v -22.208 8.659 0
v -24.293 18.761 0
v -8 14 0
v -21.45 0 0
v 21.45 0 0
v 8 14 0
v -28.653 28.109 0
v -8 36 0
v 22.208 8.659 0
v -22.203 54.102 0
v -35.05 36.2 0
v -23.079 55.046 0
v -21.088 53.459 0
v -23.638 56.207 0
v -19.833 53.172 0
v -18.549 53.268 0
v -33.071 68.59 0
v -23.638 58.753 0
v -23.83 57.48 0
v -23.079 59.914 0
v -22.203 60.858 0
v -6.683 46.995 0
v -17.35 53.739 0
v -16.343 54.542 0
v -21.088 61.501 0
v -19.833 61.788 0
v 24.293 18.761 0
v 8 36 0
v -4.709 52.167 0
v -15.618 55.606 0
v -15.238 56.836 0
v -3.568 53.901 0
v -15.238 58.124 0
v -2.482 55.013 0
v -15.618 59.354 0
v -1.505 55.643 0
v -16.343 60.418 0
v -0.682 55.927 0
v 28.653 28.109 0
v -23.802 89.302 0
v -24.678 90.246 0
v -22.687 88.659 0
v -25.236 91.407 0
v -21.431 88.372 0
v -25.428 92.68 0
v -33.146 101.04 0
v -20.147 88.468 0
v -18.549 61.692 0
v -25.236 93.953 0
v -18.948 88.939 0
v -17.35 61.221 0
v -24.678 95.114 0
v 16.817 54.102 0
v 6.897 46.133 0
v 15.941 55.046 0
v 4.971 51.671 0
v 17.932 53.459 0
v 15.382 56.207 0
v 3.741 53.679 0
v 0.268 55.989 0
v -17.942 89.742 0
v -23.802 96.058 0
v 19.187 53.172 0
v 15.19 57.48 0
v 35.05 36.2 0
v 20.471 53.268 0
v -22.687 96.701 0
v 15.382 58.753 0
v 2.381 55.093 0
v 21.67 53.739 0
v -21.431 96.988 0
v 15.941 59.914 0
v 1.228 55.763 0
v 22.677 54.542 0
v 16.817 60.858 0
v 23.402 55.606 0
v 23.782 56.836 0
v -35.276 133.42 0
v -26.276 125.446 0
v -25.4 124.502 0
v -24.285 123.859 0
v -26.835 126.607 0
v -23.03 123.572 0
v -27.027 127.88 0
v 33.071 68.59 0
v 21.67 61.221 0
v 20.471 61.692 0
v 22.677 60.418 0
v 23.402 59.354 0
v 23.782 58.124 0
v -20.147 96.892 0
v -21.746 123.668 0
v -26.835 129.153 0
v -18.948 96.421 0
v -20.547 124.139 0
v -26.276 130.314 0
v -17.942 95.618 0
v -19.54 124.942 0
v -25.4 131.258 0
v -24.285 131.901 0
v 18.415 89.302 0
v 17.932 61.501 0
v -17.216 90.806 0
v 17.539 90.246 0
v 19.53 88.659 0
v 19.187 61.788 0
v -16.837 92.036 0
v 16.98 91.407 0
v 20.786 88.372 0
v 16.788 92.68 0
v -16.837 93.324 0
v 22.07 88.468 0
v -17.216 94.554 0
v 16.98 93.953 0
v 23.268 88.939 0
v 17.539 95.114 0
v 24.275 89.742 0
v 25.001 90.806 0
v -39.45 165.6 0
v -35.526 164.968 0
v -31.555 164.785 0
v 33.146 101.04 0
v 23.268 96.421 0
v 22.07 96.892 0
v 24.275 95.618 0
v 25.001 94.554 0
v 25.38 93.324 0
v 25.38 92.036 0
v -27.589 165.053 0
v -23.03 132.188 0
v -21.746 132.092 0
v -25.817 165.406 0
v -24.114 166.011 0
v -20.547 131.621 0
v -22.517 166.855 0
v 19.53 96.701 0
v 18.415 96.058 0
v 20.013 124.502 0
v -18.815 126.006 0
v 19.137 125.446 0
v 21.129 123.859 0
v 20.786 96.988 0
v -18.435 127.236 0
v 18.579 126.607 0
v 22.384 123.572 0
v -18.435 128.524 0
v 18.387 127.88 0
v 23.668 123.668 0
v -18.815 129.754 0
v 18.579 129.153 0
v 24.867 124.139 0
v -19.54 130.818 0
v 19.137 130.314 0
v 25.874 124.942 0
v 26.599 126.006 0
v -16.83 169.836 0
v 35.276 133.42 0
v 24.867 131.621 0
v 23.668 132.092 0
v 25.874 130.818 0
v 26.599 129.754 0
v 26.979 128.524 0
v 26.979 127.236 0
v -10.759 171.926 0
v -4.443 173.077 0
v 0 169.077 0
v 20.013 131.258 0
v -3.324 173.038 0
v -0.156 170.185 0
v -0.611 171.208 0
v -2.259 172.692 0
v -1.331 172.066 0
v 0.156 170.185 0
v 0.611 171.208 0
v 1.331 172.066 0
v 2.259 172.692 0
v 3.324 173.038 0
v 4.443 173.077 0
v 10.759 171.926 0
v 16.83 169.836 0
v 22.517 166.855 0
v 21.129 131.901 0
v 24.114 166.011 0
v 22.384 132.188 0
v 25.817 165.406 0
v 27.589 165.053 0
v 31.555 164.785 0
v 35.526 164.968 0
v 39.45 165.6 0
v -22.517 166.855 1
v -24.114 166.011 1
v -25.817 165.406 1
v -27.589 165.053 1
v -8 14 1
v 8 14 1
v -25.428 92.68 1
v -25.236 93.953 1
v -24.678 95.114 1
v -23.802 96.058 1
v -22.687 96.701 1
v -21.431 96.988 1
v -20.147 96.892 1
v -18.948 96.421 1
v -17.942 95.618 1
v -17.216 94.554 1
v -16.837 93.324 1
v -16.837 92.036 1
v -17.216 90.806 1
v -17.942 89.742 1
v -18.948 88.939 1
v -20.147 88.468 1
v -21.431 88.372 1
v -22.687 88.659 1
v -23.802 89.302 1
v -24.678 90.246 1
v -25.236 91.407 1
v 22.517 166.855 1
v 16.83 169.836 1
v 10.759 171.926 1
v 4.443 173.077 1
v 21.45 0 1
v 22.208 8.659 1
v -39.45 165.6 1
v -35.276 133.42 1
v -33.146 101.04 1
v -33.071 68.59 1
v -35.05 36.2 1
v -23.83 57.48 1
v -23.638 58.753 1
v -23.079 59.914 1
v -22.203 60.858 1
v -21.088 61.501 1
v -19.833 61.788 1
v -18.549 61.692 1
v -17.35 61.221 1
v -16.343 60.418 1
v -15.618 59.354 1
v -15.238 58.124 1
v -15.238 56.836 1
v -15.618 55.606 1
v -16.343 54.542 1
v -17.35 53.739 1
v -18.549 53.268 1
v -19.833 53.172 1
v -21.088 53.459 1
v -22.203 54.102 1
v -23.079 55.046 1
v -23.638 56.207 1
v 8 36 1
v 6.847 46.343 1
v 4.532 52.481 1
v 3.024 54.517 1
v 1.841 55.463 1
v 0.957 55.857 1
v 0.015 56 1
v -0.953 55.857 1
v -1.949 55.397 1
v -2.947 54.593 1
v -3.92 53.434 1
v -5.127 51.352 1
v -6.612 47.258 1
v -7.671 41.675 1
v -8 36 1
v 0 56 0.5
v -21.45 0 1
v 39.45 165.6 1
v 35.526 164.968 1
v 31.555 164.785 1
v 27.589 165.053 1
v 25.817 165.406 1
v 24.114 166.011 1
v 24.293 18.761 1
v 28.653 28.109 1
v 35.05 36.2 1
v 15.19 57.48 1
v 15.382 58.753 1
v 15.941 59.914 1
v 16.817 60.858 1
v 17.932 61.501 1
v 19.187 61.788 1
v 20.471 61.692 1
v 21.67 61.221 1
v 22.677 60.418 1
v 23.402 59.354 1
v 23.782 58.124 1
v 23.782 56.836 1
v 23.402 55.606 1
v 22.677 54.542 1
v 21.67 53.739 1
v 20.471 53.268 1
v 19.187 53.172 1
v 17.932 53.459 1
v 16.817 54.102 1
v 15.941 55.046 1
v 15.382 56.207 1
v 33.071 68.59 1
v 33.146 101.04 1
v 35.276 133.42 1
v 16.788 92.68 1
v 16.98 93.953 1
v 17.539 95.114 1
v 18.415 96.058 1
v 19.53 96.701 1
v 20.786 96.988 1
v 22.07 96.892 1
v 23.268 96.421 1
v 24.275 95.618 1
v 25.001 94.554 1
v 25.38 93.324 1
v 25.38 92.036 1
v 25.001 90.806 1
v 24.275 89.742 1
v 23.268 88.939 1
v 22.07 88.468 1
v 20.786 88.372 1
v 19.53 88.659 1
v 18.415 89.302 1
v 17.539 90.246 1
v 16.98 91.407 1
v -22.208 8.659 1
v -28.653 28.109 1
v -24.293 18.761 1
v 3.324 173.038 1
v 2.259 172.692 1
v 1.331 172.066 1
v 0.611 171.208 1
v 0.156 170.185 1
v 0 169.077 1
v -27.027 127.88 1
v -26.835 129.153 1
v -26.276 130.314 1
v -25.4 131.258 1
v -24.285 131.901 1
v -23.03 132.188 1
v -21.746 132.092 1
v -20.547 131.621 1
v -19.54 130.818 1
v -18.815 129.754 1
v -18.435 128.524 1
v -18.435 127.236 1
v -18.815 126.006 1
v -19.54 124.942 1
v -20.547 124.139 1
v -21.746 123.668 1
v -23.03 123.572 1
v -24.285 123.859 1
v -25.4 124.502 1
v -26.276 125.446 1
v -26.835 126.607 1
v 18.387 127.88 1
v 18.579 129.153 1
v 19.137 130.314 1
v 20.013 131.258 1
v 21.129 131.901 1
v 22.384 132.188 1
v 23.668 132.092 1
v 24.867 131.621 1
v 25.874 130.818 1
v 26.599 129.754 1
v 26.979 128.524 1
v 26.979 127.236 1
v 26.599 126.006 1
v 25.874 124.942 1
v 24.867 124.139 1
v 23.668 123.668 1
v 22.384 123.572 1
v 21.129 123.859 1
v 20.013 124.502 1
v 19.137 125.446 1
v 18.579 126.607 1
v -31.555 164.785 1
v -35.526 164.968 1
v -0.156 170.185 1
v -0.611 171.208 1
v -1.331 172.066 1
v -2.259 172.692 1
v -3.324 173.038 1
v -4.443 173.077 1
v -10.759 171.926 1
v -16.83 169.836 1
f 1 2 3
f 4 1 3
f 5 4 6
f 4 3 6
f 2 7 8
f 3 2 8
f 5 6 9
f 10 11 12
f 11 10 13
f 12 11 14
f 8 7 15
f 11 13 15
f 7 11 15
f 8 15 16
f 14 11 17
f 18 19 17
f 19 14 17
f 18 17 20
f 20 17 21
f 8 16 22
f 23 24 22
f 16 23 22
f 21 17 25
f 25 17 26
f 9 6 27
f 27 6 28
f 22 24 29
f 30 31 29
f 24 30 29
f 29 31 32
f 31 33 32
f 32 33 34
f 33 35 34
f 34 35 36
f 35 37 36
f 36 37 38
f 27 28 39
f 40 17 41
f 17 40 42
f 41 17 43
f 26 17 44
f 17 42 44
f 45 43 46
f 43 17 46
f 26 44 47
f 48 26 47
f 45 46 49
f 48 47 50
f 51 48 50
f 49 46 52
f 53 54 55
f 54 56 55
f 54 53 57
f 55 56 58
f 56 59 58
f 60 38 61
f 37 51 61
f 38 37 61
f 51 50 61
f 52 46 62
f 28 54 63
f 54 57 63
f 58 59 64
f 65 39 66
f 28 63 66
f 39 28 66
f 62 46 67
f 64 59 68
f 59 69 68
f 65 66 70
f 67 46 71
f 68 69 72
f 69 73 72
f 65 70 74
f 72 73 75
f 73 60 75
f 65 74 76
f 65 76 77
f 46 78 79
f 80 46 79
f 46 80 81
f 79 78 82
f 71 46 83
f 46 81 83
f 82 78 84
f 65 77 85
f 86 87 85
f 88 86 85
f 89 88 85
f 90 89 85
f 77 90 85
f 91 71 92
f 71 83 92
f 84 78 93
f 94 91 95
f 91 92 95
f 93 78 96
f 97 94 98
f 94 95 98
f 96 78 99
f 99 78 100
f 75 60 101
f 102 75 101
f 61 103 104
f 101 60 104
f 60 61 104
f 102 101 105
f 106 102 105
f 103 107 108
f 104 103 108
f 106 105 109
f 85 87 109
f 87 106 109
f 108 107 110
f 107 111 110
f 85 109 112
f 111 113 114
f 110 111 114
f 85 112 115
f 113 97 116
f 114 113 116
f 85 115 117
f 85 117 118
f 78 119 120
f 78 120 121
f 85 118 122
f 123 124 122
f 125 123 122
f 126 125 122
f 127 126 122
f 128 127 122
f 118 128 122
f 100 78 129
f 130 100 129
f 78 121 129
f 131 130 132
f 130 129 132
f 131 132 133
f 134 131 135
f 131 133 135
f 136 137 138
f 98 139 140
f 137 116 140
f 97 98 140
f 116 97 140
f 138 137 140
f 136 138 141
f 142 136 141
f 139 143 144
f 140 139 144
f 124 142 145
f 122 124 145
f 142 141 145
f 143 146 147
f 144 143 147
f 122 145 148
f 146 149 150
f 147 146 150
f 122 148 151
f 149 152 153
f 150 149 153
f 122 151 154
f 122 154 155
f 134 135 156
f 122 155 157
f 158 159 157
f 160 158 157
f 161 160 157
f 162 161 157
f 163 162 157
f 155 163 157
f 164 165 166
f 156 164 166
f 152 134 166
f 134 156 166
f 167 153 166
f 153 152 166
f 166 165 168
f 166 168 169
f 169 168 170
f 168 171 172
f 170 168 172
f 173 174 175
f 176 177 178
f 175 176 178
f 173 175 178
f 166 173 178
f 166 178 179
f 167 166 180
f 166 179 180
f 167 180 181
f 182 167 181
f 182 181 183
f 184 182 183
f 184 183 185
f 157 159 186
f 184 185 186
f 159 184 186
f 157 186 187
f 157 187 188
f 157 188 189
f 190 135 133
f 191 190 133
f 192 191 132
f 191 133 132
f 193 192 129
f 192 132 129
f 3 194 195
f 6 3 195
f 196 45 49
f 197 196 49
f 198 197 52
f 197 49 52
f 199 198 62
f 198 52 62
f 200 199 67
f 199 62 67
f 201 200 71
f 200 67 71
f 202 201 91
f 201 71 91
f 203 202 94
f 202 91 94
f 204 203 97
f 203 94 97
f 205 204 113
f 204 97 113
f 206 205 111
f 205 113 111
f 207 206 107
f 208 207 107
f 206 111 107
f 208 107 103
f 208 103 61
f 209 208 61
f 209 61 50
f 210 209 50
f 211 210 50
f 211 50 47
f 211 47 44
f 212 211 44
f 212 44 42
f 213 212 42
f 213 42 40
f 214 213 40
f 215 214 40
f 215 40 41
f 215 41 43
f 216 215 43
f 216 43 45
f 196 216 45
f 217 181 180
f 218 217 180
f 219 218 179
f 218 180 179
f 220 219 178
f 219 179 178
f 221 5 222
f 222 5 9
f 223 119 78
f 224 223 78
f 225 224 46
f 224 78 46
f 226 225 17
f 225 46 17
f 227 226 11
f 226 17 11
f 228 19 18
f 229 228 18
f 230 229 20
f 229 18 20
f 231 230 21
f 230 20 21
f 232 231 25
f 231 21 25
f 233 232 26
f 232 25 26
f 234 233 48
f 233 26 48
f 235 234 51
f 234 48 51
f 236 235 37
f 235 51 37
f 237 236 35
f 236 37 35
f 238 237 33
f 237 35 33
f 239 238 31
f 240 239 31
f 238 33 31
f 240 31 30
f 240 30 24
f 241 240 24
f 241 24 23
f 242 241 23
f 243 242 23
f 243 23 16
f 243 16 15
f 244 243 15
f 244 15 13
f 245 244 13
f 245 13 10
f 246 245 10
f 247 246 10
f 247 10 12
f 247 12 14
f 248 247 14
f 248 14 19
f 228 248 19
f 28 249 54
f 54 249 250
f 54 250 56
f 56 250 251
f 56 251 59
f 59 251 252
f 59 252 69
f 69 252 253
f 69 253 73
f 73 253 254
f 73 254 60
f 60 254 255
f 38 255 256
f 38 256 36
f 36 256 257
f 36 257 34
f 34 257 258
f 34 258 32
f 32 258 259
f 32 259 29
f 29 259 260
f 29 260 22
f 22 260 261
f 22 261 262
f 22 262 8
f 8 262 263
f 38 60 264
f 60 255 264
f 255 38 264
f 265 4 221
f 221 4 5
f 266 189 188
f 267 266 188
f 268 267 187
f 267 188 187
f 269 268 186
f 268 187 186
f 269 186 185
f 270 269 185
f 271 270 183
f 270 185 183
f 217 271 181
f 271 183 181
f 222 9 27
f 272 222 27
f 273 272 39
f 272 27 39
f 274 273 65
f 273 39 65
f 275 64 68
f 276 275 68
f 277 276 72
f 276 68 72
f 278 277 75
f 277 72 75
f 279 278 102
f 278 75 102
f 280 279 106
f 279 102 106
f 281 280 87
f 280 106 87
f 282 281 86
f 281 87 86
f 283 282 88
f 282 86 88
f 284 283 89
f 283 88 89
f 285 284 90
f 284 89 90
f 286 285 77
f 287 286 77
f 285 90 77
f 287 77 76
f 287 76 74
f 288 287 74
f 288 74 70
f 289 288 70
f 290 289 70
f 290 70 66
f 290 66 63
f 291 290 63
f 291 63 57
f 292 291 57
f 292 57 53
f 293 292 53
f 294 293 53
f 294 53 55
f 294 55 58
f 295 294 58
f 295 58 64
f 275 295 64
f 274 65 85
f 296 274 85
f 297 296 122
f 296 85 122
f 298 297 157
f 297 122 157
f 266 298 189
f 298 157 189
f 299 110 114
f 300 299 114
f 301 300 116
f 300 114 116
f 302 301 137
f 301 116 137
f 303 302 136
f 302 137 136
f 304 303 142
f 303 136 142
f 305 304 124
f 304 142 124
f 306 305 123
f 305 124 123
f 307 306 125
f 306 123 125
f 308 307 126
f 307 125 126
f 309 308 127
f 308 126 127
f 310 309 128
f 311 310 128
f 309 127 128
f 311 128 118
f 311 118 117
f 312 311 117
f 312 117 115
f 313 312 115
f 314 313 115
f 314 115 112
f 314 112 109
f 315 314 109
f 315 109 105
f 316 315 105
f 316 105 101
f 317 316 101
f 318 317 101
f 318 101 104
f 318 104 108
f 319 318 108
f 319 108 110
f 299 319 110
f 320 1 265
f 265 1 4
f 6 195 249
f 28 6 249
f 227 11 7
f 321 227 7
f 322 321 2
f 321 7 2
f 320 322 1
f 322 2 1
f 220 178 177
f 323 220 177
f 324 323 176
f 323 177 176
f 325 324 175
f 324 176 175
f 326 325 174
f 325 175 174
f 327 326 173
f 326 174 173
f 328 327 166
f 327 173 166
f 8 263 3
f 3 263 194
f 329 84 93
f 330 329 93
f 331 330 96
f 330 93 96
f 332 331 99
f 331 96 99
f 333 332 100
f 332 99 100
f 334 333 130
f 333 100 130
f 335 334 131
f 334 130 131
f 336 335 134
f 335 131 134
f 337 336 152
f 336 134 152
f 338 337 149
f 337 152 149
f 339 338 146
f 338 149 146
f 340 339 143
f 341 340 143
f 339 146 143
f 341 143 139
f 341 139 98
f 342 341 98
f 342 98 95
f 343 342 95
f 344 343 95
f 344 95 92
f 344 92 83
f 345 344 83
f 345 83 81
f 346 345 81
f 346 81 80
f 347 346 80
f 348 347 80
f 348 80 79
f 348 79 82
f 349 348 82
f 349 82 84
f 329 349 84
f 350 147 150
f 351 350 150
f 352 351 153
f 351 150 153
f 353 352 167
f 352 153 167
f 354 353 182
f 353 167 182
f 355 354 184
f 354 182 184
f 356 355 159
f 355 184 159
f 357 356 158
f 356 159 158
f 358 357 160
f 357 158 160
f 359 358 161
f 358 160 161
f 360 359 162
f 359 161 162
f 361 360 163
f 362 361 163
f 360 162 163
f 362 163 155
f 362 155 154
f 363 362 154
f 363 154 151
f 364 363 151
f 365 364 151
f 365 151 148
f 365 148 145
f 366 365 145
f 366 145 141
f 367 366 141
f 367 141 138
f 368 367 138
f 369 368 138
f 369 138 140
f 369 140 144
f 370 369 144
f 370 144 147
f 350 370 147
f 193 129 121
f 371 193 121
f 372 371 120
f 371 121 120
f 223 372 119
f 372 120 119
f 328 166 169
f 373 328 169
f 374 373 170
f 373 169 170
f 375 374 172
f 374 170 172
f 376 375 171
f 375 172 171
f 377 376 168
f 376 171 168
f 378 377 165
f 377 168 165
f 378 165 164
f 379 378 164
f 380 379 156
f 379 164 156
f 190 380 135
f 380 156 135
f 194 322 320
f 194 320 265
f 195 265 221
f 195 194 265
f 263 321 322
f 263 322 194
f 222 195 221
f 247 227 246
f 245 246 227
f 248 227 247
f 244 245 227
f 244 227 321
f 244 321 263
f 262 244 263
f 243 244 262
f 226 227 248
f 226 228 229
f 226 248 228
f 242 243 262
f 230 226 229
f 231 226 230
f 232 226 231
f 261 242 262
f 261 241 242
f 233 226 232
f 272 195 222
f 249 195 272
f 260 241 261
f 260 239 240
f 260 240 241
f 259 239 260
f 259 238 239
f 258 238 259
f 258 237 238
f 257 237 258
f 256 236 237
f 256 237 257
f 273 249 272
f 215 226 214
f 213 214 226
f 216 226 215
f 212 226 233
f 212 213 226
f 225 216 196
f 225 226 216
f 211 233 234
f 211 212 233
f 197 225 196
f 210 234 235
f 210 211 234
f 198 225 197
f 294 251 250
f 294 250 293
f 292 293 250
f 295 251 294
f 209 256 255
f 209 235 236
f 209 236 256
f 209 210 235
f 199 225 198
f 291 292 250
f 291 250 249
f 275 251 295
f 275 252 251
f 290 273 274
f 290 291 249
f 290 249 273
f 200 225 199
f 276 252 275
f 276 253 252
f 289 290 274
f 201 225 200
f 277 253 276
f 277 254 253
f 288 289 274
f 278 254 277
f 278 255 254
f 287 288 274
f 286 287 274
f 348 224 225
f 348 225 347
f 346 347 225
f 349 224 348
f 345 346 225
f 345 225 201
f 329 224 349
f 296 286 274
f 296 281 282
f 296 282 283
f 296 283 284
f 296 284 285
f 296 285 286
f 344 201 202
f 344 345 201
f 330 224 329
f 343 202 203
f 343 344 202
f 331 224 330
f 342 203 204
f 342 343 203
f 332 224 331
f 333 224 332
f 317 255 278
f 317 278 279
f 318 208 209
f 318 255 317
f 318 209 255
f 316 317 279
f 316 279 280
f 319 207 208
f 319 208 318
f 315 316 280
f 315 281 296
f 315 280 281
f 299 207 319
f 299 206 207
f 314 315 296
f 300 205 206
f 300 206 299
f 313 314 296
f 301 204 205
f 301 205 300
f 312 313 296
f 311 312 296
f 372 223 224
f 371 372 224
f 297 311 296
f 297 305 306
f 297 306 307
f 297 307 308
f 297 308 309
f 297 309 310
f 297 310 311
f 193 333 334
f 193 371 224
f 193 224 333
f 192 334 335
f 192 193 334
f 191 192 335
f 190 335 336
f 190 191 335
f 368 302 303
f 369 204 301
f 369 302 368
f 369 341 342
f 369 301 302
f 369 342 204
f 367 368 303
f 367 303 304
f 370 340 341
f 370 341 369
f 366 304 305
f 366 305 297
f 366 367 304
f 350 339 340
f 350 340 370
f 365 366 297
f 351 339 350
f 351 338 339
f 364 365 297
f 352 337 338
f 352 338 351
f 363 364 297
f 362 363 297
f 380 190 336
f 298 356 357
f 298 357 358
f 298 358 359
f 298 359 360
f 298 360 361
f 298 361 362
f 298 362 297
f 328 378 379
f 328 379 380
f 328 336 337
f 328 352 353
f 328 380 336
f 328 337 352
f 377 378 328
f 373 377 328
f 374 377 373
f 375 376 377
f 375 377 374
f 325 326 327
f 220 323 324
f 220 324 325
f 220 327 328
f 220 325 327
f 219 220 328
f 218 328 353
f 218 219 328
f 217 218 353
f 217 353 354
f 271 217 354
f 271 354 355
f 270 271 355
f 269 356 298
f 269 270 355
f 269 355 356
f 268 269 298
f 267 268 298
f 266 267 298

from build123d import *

# Parameters (mm, degrees)
F1_DEPTH = 1
F3_D     = 8.64
F4_DEPTH = 25


with BuildPart() as f1:
    # F0 (on Top) → F1 (new body)
    with BuildSketch(Plane.XY):
        with BuildLine():
            Line((-21.45, 0), (0, 0))
            Line((0, 0), (21.45, 0))
            Line((21.45, 0), (22.2075974907, 8.6593789428))
            ThreePointArc((22.2075974907, 8.6593789428), (26.2007214664, 23.5619205011), (35.05, 36.2))
            ThreePointArc((35.05, 36.2), (33.1464754087, 101.0395325209), (39.45, 165.6))
            ThreePointArc((39.45, 165.6), (33.5426879174, 164.8198684719), (27.5886514491, 165.0530872052))
            ThreePointArc((27.5886514491, 165.0530872052), (24.9545680687, 165.6778337109), (22.5167661948, 166.8550445988))
            ThreePointArc((22.5167661948, 166.8550445988), (13.834235102, 170.9953697151), (4.4430186473, 173.0771218005))
            ThreePointArc((4.4430186473, 173.0771218005), (1.3309419019, 172.0659808949), (0, 169.0766630372))
            ThreePointArc((0, 169.0766630372), (-1.3309419019, 172.0659808949), (-4.4430186473, 173.0771218005))
            ThreePointArc((-4.4430186473, 173.0771218005), (-13.834235102, 170.9953697151), (-22.5167661948, 166.8550445988))
            ThreePointArc((-22.5167661948, 166.8550445988), (-24.9545680687, 165.6778337109), (-27.5886514491, 165.0530872052))
            ThreePointArc((-27.5886514491, 165.0530872052), (-33.5426879174, 164.8198684719), (-39.45, 165.6))
            ThreePointArc((-39.45, 165.6), (-33.1464754087, 101.0395325209), (-35.05, 36.2))
            ThreePointArc((-35.05, 36.2), (-26.2007214664, 23.5619205011), (-22.2075974907, 8.6593789428))
            Line((-22.2075974907, 8.6593789428), (-21.45, 0))
        make_face()
    extrude(amount=F1_DEPTH)

    # F3 (through all)
    with Locations(Plane.XY.offset(1)):
        with Locations((-19.51, 57.48), (-21.1084226467, 92.68), (-22.7068452934, 127.88), (22.7068452934, 127.88), (21.1084226467, 92.68), (19.51, 57.48)):
            Hole(F3_D / 2)

    # F5 (on face) → F4 (cut)
    with BuildSketch(Plane.XY.offset(1)):
        with BuildLine():
            Line((-8, 14), (0, 14))
            Line((0, 14), (8, 14))
            Line((8, 14), (8, 36))
            add(Edge.make_bspline(
                [(8, 36), (8, 56), (0, 56), (-8, 56), (-8, 36)],
                knots=[4.7123889804, 4.7123889804, 4.7123889804, 6.2831853072, 6.2831853072, 7.853981634, 7.853981634, 7.853981634], degree=2, weights=[1, 0.7071067812, 1, 0.7071067812, 1]))
            Line((-8, 36), (-8, 14))
        make_face()
    extrude(amount=-F4_DEPTH, mode=Mode.SUBTRACT)


solid = f1.part
